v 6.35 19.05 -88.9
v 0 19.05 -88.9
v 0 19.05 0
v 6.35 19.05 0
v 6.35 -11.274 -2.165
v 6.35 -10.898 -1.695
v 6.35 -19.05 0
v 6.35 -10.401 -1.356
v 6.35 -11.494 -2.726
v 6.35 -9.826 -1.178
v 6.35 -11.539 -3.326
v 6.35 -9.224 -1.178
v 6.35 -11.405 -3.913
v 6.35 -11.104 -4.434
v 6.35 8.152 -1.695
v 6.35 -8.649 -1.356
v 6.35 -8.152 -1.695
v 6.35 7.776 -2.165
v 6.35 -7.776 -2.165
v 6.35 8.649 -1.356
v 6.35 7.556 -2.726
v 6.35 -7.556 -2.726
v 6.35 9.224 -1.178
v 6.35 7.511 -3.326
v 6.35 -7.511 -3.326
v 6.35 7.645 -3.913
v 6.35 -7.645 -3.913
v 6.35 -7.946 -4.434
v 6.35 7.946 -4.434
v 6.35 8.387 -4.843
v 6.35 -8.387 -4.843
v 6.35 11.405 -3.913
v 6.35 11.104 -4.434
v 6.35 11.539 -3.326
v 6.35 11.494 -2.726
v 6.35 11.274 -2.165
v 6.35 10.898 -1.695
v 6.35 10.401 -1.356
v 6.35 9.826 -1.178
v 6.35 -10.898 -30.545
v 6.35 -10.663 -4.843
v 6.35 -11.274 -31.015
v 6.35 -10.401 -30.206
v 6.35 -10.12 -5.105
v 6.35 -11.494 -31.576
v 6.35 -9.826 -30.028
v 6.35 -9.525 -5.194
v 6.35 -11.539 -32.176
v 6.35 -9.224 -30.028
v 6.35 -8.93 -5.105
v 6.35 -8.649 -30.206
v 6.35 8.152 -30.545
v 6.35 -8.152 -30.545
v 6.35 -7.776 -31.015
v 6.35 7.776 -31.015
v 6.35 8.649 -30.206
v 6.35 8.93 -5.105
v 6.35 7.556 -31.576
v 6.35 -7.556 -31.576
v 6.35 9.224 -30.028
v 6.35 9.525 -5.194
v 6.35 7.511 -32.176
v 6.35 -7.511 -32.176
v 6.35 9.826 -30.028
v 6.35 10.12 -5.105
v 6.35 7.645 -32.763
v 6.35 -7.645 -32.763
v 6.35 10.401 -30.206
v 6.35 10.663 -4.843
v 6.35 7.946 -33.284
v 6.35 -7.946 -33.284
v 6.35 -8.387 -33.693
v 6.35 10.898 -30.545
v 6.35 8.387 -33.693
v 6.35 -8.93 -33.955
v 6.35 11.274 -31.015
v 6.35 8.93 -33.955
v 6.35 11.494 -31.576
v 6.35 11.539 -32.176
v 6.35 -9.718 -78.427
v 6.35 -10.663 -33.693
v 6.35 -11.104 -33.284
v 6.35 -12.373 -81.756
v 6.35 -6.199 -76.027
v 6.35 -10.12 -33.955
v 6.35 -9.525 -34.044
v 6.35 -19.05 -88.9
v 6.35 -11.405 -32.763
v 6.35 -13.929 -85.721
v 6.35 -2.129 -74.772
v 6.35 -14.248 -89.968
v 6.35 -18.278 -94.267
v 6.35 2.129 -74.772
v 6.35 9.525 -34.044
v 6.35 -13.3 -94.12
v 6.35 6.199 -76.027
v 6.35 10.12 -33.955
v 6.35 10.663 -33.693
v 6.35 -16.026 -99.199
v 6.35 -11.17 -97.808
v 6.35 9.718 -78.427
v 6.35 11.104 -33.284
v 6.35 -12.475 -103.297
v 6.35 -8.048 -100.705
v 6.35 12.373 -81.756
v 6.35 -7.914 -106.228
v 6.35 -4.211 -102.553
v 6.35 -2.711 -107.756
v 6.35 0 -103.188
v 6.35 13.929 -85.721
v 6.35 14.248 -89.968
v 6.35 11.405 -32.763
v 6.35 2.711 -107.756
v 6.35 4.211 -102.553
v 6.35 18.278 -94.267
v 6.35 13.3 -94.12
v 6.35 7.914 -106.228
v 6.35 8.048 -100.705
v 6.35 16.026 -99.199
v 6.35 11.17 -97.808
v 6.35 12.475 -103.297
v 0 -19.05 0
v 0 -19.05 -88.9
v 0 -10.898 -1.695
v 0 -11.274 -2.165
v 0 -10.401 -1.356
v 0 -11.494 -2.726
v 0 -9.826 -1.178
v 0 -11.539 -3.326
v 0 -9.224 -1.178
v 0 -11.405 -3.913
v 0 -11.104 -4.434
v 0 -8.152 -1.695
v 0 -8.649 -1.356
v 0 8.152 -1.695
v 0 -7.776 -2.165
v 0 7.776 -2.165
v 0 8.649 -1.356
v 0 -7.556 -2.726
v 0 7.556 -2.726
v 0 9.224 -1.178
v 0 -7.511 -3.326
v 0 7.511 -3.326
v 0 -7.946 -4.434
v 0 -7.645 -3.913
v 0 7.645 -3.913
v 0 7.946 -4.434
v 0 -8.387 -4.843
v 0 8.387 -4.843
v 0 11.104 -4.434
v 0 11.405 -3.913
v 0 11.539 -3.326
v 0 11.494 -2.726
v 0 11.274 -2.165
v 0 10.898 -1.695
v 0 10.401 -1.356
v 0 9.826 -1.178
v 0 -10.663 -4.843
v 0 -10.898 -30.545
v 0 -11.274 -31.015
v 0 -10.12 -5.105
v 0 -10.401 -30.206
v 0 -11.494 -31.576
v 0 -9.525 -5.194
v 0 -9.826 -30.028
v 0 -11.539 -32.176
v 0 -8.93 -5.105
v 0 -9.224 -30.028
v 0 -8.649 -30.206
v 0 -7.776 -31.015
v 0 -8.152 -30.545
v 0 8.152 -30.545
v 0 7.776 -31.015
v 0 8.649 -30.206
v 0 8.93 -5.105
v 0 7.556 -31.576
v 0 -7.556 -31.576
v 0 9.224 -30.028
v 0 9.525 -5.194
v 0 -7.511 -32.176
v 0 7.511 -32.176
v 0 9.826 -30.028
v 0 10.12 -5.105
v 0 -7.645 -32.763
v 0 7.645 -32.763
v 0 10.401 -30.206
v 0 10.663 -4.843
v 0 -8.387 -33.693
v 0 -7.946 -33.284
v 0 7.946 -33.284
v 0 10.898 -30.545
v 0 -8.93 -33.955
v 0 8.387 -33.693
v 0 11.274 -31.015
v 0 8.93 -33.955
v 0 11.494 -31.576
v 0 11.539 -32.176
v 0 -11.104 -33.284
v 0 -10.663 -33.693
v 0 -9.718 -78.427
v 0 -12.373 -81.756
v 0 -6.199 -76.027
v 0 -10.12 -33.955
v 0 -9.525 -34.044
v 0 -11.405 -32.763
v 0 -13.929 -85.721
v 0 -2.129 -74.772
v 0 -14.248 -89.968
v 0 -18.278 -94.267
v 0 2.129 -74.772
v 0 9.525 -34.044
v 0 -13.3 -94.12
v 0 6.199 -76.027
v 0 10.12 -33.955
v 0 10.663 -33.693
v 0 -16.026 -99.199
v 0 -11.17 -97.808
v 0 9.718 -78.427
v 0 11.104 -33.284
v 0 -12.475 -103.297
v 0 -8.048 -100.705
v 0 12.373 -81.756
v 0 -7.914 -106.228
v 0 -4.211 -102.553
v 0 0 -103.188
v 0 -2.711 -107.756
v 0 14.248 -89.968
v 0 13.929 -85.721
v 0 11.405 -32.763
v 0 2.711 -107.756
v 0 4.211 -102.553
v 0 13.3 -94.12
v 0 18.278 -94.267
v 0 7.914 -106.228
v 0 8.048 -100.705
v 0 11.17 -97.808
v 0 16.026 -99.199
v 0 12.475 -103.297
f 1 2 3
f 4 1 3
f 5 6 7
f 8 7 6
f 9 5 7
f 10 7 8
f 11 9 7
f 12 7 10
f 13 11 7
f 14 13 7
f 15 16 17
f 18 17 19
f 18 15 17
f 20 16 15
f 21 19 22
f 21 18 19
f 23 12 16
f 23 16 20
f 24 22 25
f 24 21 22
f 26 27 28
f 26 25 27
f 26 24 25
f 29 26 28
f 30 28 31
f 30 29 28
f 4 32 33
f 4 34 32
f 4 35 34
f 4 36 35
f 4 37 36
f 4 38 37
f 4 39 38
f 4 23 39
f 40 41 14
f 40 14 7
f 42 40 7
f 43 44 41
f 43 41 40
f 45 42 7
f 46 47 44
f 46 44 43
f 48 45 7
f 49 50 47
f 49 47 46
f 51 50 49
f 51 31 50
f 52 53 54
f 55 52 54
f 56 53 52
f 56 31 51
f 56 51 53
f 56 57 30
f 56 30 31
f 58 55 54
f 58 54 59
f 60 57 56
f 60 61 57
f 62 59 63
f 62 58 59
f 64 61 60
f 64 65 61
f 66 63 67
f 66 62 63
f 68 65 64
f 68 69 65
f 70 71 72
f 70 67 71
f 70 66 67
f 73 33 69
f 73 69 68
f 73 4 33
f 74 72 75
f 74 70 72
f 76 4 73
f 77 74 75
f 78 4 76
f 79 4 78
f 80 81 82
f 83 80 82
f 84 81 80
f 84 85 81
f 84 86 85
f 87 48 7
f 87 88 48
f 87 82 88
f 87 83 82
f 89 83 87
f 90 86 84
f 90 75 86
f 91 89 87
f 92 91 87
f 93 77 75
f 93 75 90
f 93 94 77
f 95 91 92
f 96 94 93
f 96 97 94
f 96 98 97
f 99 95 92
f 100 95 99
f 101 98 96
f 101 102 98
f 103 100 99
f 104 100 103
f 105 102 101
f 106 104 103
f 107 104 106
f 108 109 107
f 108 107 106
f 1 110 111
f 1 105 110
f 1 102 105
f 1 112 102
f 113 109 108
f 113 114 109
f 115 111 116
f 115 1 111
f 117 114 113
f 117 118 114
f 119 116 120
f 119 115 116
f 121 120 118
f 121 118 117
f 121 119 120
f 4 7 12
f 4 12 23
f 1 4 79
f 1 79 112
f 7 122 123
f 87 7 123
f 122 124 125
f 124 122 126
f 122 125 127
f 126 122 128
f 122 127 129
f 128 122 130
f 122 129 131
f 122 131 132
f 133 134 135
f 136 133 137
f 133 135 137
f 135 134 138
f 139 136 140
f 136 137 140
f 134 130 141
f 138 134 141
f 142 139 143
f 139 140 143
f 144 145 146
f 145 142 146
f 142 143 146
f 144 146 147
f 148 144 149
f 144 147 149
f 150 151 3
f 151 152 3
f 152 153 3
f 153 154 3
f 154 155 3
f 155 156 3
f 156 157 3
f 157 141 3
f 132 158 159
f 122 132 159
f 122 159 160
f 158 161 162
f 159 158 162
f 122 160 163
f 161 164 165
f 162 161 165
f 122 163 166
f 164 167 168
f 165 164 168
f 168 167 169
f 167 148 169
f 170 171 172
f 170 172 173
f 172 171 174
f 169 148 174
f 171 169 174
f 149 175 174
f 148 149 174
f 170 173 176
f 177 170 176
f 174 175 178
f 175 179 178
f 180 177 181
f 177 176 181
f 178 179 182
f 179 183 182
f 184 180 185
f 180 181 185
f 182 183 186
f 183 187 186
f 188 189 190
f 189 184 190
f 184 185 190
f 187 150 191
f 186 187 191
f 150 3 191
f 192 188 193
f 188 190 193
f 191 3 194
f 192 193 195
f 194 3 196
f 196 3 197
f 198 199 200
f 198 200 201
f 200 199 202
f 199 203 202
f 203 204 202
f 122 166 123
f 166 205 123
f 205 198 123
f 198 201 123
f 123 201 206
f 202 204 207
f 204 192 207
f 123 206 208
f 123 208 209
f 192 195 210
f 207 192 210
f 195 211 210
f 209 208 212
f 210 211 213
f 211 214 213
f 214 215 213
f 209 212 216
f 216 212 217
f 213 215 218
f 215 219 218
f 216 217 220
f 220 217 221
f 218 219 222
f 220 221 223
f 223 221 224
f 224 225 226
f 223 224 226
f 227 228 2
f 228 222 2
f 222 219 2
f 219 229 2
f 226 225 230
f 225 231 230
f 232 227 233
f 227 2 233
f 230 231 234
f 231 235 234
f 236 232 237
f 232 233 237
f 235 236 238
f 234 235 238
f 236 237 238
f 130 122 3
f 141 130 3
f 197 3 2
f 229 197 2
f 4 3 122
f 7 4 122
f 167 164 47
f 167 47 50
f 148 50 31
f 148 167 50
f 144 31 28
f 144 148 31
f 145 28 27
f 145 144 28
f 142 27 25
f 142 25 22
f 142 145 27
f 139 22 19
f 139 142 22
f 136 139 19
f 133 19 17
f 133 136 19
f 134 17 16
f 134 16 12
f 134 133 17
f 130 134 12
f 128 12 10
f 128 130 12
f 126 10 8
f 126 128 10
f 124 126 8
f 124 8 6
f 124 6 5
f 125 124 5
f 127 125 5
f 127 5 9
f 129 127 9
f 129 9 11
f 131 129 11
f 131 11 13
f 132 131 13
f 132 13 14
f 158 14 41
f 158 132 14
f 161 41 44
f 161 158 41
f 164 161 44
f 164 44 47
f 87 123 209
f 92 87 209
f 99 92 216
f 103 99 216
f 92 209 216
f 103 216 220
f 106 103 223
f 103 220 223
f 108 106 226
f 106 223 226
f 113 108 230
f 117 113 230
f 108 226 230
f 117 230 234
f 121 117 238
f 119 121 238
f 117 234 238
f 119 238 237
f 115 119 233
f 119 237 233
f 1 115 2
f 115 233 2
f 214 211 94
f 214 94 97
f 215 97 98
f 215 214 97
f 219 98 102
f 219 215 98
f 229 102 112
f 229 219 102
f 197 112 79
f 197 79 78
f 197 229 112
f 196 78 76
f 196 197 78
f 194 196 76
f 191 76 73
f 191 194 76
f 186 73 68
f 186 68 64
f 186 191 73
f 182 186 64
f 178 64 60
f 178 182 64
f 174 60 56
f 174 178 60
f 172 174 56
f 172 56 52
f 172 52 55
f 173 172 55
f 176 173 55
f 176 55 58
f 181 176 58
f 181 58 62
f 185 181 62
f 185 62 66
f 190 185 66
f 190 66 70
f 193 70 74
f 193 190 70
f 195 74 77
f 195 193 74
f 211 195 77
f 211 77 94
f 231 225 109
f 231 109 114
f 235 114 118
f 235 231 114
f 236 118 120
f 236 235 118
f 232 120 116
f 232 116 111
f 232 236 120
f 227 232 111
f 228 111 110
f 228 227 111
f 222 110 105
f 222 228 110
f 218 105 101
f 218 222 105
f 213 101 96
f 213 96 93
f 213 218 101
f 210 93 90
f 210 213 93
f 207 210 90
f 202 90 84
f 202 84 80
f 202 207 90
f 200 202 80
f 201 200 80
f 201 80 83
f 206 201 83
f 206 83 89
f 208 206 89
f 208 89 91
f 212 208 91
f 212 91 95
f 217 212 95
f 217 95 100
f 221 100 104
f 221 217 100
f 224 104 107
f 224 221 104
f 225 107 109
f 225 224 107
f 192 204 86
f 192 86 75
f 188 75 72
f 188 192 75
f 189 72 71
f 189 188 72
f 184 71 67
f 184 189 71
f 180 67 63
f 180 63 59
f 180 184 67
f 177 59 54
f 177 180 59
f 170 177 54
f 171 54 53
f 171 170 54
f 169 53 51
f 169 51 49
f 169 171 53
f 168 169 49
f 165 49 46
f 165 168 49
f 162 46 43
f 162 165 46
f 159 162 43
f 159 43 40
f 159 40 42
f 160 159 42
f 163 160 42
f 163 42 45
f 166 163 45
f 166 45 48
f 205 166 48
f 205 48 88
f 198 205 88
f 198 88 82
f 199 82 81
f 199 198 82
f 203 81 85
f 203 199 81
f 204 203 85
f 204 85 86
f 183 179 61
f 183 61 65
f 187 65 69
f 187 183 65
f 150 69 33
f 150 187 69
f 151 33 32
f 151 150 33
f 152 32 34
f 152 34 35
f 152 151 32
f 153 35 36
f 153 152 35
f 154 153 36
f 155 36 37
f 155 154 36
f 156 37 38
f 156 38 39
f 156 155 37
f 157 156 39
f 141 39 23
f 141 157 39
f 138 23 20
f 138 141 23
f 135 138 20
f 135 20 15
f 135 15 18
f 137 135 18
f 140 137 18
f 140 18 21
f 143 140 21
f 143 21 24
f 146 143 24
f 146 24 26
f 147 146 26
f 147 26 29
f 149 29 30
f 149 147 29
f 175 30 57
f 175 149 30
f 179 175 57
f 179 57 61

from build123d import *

# Parameters (mm, degrees)
SKETCH2_R           = 14.2875
SKETCH2_R_2         = 2.0193
BOSS_EXTRUDE1_DEPTH = 6.35


with BuildPart() as part:
    # Sketch2 → Boss-Extrude1 (new body)
    with BuildSketch(Plane(origin=(0, 0, 0), x_dir=(0, 0, -1), z_dir=(1, 0, 0))):
        with BuildLine():
            Line((0, 19.05), (0, -19.05))
            Line((0, -19.05), (88.9, -19.05))
            ThreePointArc((88.9, -19.05), (107.95, 0), (88.9, 19.05))
            Line((88.9, 19.05), (0, 19.05))
        make_face()
        with Locations((88.9, 0)):
            Circle(SKETCH2_R, mode=Mode.SUBTRACT)
        with Locations((3.175, -9.525)):
            Circle(SKETCH2_R_2, mode=Mode.SUBTRACT)
        with Locations((3.175, 9.525)):
            Circle(SKETCH2_R_2, mode=Mode.SUBTRACT)
        with Locations((32.025, -9.525)):
            Circle(SKETCH2_R_2, mode=Mode.SUBTRACT)
        with Locations((32.025, 9.525)):
            Circle(SKETCH2_R_2, mode=Mode.SUBTRACT)
    extrude(amount=BOSS_EXTRUDE1_DEPTH)


solid = part.part
